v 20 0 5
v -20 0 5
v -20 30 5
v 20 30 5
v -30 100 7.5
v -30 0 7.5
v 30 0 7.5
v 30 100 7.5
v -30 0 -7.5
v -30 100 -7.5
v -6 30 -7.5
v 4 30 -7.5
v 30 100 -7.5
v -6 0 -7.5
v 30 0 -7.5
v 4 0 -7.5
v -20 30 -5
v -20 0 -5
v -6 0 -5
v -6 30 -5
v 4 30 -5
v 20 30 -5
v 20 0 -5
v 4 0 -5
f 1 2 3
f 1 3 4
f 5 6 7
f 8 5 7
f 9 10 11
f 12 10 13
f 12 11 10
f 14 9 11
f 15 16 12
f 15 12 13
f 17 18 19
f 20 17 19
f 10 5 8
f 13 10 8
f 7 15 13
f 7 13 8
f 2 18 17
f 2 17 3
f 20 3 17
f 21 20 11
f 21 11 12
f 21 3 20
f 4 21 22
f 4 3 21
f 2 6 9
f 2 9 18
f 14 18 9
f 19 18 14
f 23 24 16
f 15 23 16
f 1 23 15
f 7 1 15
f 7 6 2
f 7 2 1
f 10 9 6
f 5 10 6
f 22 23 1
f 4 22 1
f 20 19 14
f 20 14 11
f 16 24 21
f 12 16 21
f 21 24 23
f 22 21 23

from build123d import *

# Parameters (mm, degrees)
F0_W     = 60
F0_H     = 15
F1_DEPTH = 100
F2_W     = 40
F2_H     = 10
F3_DEPTH = 30
F4_W     = 10
F4_H     = 30
F5_DEPTH = 25


with BuildPart() as f1:
    # F0 (on Front) → F1 (new body)
    with BuildSketch(Plane.XZ):
        Rectangle(F0_W, F0_H)
    extrude(amount=-F1_DEPTH)

    # F2 (on face) → F3 (cut)
    with BuildSketch(Plane.XZ):
        Rectangle(F2_W, F2_H)
    extrude(amount=-F3_DEPTH, mode=Mode.SUBTRACT)

    # F4 (on face) → F5 (cut)
    with BuildSketch(Plane.XY.offset(-5)):
        with Locations((-1, 15)):
            Rectangle(F4_W, F4_H)
    extrude(amount=-F5_DEPTH, mode=Mode.SUBTRACT)


solid = f1.part
